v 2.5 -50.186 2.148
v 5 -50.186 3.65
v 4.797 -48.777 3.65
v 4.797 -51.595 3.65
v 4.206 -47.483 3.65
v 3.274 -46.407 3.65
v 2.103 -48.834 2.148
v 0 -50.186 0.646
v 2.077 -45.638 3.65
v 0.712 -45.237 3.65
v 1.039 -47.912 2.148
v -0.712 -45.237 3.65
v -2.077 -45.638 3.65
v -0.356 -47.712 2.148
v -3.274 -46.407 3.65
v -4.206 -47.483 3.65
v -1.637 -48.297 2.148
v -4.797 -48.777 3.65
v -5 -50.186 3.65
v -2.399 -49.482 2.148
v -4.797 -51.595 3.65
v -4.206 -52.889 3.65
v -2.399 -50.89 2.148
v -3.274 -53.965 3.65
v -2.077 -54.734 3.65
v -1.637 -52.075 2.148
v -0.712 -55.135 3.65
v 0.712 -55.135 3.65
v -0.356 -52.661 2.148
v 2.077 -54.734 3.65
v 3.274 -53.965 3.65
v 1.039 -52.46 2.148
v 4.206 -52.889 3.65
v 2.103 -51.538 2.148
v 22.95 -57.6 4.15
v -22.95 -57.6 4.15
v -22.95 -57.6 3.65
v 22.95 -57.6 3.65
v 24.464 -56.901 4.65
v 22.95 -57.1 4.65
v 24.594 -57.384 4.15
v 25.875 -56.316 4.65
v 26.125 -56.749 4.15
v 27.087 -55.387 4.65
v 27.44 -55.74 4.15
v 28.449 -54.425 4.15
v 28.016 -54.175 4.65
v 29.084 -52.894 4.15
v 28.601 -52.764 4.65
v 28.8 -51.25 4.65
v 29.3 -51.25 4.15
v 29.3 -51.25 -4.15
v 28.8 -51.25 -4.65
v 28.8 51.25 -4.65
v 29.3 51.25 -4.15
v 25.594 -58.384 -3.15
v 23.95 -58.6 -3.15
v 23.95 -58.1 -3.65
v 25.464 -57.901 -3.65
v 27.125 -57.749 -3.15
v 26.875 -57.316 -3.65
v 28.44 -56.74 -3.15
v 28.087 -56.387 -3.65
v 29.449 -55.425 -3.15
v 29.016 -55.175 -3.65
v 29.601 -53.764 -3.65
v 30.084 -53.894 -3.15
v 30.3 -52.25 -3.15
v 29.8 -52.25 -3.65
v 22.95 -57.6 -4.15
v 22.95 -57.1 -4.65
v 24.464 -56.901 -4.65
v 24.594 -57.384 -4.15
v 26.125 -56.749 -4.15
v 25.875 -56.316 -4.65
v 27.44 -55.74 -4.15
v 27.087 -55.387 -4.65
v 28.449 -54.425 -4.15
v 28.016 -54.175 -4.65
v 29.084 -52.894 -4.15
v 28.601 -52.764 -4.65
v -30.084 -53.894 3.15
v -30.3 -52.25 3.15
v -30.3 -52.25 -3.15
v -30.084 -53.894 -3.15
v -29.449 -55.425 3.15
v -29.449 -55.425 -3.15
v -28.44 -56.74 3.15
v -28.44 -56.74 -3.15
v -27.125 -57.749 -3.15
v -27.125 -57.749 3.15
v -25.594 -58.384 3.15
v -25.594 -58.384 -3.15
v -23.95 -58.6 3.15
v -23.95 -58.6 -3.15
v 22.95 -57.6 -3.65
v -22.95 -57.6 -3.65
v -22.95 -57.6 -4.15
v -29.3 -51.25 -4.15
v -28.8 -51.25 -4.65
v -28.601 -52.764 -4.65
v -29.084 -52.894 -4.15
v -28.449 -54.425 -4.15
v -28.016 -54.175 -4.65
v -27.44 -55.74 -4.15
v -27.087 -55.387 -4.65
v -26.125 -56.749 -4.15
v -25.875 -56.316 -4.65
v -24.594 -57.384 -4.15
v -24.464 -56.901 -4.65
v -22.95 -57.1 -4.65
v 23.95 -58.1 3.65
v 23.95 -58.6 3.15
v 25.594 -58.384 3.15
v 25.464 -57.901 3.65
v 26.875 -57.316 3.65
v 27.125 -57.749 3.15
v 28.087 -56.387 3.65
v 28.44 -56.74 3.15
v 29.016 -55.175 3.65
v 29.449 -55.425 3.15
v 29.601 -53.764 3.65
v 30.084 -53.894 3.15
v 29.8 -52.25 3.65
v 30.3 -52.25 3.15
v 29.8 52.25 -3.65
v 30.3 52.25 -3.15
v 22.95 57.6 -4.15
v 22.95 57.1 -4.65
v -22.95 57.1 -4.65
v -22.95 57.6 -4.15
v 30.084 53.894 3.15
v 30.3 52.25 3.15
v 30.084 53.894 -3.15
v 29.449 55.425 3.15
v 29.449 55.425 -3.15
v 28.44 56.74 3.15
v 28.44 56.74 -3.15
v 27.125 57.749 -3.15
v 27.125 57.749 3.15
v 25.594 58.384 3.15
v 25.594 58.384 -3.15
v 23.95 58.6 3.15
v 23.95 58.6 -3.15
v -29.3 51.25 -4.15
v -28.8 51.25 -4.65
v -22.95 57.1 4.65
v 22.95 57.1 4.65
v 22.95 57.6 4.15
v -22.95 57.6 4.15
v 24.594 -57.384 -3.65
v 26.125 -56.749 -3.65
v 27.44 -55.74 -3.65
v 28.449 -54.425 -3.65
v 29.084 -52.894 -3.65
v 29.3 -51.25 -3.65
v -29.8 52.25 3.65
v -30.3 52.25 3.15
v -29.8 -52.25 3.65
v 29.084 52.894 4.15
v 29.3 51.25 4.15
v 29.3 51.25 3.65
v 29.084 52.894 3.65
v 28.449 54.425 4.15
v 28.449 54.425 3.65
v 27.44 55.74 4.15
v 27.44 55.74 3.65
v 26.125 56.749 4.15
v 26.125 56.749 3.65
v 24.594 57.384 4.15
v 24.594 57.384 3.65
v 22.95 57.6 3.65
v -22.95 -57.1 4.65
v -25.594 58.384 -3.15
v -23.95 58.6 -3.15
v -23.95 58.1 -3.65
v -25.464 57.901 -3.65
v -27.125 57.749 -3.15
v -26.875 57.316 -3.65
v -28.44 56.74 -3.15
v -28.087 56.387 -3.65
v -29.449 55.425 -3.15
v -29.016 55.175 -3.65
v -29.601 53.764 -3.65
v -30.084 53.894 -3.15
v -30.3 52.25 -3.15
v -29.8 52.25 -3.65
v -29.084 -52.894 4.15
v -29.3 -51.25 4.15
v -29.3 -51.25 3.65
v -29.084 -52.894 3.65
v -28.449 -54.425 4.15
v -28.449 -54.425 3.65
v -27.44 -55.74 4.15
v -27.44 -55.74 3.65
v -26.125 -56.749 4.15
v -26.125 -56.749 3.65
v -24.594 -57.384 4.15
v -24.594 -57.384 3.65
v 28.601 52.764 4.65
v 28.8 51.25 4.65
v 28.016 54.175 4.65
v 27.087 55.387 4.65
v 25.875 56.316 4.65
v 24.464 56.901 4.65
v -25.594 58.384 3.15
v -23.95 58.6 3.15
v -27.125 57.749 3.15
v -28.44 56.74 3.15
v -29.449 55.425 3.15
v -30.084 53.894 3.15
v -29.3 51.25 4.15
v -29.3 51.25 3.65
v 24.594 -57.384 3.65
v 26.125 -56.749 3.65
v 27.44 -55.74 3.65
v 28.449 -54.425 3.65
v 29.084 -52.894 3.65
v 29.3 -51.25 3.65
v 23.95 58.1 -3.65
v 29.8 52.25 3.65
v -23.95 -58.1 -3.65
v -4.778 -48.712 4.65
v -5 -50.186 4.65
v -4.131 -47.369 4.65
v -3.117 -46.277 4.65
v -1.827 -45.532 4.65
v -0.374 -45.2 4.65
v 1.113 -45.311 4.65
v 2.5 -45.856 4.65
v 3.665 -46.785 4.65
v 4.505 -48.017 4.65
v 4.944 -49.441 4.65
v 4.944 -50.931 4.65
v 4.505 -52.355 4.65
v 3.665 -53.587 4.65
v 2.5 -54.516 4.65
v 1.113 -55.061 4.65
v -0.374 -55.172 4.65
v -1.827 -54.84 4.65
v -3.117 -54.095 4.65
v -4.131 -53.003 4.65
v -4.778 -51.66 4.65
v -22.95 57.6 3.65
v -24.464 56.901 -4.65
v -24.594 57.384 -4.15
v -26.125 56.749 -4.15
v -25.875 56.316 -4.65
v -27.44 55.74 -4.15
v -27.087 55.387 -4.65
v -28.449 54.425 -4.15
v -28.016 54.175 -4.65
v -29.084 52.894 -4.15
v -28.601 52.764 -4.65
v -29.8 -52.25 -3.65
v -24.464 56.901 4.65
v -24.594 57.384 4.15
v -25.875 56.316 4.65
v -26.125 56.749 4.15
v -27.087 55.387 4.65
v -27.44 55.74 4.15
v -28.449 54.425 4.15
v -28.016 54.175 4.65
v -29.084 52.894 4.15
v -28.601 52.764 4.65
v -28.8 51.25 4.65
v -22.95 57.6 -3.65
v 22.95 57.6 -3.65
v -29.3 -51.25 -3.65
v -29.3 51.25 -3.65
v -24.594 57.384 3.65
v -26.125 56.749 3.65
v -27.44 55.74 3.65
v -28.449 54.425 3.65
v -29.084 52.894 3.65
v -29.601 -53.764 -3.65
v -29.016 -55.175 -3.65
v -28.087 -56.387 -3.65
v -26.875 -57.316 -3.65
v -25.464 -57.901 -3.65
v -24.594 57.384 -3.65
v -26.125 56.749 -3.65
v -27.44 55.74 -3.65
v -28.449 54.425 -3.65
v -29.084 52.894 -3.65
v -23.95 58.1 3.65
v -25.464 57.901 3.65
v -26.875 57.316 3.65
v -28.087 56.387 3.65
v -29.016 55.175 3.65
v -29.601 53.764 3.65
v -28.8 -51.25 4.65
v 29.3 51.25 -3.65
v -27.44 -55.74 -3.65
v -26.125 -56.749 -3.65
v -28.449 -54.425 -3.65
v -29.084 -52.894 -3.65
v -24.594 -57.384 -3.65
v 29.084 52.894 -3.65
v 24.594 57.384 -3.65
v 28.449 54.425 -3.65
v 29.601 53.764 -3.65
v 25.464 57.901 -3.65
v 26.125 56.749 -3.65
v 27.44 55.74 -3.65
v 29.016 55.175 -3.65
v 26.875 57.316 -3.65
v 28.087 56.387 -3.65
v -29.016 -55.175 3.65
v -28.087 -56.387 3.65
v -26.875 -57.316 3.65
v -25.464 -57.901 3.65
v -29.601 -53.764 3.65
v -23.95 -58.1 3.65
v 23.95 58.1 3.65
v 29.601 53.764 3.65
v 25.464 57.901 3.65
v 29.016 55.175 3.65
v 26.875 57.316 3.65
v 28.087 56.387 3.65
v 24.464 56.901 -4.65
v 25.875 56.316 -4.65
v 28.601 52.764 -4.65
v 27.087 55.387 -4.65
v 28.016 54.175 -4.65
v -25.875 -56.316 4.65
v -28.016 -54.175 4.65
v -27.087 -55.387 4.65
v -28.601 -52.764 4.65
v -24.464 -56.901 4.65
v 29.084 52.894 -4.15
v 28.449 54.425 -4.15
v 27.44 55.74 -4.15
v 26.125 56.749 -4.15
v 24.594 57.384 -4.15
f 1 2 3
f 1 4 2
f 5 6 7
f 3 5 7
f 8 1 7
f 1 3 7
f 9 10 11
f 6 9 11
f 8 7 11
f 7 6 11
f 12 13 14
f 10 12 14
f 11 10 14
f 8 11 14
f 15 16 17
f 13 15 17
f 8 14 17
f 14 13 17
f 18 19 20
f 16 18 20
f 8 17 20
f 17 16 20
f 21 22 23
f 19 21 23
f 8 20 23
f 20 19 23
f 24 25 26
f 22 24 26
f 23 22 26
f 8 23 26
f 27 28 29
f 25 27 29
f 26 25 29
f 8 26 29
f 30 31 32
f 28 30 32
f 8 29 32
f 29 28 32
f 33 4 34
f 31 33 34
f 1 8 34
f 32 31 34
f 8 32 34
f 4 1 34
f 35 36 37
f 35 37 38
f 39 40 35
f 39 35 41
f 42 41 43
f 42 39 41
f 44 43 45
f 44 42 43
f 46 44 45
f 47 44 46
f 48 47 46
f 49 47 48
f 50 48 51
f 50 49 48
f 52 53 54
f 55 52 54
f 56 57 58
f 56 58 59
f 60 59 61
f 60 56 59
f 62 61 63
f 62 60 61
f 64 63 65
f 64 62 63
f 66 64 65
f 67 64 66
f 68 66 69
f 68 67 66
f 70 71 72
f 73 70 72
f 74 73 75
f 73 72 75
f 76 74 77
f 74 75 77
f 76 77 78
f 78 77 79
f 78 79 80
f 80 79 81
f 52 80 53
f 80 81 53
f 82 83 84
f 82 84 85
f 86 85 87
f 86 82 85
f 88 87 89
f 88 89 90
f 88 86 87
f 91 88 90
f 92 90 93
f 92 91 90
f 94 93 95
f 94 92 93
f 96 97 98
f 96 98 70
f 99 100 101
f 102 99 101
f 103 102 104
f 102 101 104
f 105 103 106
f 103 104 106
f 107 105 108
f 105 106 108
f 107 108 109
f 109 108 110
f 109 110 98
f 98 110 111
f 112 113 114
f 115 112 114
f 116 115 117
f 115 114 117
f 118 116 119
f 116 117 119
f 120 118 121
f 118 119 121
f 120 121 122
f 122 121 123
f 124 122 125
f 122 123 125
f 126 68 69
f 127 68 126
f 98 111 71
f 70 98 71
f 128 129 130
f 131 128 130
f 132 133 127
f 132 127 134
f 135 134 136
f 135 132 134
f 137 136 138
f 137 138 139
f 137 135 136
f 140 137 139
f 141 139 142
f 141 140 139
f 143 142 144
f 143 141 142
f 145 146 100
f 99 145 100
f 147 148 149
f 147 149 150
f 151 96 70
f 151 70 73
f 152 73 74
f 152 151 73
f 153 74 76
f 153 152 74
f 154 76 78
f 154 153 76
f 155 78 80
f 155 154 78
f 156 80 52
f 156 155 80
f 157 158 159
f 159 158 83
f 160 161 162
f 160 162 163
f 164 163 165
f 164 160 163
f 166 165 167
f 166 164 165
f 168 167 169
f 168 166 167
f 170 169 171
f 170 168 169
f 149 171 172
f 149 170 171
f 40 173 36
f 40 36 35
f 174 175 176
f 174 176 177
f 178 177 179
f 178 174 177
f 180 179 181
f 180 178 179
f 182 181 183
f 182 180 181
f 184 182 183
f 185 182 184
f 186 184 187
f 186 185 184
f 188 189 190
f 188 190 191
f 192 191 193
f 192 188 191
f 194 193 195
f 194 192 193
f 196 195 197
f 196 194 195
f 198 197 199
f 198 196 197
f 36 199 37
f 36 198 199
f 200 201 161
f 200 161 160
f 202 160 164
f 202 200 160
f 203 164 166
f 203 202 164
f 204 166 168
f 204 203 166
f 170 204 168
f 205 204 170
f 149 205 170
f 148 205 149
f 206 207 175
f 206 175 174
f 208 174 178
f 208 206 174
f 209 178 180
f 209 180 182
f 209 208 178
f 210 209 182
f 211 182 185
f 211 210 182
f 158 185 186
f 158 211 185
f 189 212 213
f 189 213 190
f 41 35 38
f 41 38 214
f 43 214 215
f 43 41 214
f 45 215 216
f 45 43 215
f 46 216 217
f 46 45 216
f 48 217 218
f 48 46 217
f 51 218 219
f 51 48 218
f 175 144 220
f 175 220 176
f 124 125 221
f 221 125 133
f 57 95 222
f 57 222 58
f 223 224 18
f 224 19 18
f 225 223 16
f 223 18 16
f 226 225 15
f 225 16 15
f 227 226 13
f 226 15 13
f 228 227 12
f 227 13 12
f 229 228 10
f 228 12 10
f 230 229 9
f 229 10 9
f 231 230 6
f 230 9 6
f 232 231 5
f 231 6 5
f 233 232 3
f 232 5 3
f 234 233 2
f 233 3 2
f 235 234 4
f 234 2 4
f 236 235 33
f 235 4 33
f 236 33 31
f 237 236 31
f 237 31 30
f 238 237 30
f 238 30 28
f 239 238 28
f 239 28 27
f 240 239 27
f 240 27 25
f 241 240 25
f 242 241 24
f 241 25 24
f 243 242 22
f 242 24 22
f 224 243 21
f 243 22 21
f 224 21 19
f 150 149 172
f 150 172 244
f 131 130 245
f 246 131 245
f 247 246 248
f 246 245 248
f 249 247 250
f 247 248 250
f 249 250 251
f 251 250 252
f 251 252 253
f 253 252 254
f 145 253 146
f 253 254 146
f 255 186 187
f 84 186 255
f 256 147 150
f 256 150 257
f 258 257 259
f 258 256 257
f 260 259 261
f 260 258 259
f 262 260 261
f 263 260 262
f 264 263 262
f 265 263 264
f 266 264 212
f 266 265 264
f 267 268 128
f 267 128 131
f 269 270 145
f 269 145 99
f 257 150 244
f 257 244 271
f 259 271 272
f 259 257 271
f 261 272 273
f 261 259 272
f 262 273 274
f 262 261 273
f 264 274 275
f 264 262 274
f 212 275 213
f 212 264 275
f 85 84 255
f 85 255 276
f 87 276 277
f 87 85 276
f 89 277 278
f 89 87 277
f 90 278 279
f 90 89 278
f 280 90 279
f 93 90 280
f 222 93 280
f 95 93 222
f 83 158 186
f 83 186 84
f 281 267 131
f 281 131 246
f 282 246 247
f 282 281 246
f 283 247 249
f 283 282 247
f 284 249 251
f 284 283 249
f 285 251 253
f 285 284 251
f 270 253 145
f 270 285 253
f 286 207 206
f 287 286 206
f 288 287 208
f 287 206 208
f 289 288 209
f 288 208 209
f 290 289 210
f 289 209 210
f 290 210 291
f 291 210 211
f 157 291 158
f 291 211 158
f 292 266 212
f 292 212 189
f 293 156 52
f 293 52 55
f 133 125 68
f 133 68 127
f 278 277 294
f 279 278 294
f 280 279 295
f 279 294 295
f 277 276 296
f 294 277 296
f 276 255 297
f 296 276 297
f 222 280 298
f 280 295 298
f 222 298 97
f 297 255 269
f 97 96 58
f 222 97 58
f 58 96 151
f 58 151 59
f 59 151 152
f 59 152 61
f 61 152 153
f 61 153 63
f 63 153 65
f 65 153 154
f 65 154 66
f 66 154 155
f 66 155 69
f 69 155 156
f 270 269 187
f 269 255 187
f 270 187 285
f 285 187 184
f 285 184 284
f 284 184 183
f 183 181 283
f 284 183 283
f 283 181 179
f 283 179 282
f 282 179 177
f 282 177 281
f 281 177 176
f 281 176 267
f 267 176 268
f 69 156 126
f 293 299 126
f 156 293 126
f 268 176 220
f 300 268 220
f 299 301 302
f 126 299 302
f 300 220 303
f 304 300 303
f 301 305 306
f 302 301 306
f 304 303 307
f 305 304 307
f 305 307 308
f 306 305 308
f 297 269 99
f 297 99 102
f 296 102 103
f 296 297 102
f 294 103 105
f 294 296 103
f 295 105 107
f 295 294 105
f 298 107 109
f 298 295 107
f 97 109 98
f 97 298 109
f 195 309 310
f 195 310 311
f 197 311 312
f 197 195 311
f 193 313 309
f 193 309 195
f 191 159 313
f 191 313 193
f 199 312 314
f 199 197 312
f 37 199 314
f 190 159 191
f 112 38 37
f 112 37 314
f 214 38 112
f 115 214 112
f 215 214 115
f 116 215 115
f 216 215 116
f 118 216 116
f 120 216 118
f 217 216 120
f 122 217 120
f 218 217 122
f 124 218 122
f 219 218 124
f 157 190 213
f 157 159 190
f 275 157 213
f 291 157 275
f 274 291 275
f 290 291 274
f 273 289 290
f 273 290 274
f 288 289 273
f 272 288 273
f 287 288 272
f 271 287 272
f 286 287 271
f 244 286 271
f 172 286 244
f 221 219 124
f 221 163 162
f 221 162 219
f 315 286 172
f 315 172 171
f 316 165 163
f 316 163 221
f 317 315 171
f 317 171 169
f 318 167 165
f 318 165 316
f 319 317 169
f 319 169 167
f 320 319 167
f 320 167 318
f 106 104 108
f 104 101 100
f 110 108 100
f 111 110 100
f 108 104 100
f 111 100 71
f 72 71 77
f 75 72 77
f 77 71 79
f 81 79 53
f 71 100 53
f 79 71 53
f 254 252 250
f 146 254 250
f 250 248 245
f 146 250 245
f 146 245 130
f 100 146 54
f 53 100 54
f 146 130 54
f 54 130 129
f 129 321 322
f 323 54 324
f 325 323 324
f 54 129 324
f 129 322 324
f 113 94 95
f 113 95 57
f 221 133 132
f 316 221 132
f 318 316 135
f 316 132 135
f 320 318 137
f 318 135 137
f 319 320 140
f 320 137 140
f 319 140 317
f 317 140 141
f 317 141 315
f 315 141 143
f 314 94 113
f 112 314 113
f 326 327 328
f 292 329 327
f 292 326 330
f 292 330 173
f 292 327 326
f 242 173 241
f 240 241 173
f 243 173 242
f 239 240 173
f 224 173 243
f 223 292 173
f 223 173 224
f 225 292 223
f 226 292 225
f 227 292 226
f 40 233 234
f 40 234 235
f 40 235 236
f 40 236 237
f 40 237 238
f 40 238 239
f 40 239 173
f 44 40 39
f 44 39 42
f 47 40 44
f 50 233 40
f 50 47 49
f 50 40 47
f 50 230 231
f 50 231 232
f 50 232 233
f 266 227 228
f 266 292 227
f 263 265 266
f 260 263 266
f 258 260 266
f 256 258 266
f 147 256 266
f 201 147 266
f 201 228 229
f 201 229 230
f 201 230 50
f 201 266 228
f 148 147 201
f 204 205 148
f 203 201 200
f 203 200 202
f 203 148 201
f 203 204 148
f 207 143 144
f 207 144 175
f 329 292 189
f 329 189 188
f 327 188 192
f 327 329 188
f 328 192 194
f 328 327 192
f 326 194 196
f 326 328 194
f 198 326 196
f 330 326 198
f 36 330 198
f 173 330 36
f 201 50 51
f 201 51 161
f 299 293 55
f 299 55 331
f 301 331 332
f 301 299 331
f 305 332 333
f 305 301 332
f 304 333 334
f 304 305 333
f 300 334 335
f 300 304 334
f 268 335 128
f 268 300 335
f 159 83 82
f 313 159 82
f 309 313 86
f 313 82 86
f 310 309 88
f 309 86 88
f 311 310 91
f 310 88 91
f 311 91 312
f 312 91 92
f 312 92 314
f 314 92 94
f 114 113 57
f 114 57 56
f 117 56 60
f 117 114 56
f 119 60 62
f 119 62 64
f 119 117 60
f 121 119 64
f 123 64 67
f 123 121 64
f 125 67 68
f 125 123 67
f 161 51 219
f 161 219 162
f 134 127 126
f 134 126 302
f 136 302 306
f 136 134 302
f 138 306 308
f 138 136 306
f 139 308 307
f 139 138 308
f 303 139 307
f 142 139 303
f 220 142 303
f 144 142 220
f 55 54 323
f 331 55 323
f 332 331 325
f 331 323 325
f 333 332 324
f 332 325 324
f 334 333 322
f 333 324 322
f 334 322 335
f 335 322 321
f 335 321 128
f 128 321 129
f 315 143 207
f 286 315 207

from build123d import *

# Parameters (mm, degrees)
F1_DEPTH = 4.65
F3_DEPTH = 3.65
F4_SIZE  = 0.5
F5_SIZE  = 0.5
F6_SIZE  = 0.5
F7_SIZE  = 0.5
F9_D     = 10
F9_DEPTH = 1
F9_TIP   = 3.0043030951


with BuildPart() as f1:
    # F0 (on Top) → F1 (new body, symmetric)
    with BuildSketch(Plane.XY):
        with BuildLine():
            Line((-22.95, -57.6), (22.95, -57.6))
            ThreePointArc((22.95, -57.6), (27.4401280605, -55.7401280605), (29.3, -51.25))
            Line((29.3, -51.25), (29.3, 51.25))
            ThreePointArc((29.3, 51.25), (27.4401280605, 55.7401280605), (22.95, 57.6))
            Line((22.95, 57.6), (-22.95, 57.6))
            ThreePointArc((-22.95, 57.6), (-27.4401280605, 55.7401280605), (-29.3, 51.25))
            Line((-29.3, 51.25), (-29.3, -51.25))
            ThreePointArc((-29.3, -51.25), (-27.4401280605, -55.7401280605), (-22.95, -57.6))
        make_face()
    extrude(amount=F1_DEPTH, both=True)

    # F2 (on Top) → F3 (join, symmetric)
    with BuildSketch(Plane.XY):
        with BuildLine():
            Line((-23.95, -58.6), (23.95, -58.6))
            ThreePointArc((23.95, -58.6), (28.4401280605, -56.7401280605), (30.3, -52.25))
            Line((30.3, -52.25), (30.3, 52.25))
            ThreePointArc((30.3, 52.25), (28.4401280605, 56.7401280605), (23.95, 58.6))
            Line((23.95, 58.6), (-23.95, 58.6))
            ThreePointArc((-23.95, 58.6), (-28.4401280605, 56.7401280605), (-30.3, 52.25))
            Line((-30.3, 52.25), (-30.3, -52.25))
            ThreePointArc((-30.3, -52.25), (-28.4401280605, -56.7401280605), (-23.95, -58.6))
        make_face()
    extrude(amount=F3_DEPTH, both=True)

    # F4
    f4_edges = [f1.edges().sort_by_distance(p)[0] for p in [
        (-30.3, 0, 3.65),
    ]]
    chamfer(f4_edges, length=F4_SIZE)

    # F5
    f5_edges = [f1.edges().sort_by_distance(p)[0] for p in [
        (-30.3, 0, -3.65),
    ]]
    chamfer(f5_edges, length=F5_SIZE)

    # F6
    f6_edges = [f1.edges().sort_by_distance(p)[0] for p in [
        (-29.3, 0, 4.65),
    ]]
    chamfer(f6_edges, length=F6_SIZE)

    # F7
    f7_edges = [f1.edges().sort_by_distance(p)[0] for p in [
        (29.3, 0, -4.65),
    ]]
    chamfer(f7_edges, length=F7_SIZE)

    # F9
    with Locations(Plane.XY.offset(4.65)):
        with Locations((0, -50.1860789955)):
            Hole(F9_D / 2, depth=F9_DEPTH)
            with Locations((0, 0, -(F9_DEPTH + F9_TIP / 2))):  # 118° drill point
                Cone(0, F9_D / 2, F9_TIP, mode=Mode.SUBTRACT)


solid = f1.part
